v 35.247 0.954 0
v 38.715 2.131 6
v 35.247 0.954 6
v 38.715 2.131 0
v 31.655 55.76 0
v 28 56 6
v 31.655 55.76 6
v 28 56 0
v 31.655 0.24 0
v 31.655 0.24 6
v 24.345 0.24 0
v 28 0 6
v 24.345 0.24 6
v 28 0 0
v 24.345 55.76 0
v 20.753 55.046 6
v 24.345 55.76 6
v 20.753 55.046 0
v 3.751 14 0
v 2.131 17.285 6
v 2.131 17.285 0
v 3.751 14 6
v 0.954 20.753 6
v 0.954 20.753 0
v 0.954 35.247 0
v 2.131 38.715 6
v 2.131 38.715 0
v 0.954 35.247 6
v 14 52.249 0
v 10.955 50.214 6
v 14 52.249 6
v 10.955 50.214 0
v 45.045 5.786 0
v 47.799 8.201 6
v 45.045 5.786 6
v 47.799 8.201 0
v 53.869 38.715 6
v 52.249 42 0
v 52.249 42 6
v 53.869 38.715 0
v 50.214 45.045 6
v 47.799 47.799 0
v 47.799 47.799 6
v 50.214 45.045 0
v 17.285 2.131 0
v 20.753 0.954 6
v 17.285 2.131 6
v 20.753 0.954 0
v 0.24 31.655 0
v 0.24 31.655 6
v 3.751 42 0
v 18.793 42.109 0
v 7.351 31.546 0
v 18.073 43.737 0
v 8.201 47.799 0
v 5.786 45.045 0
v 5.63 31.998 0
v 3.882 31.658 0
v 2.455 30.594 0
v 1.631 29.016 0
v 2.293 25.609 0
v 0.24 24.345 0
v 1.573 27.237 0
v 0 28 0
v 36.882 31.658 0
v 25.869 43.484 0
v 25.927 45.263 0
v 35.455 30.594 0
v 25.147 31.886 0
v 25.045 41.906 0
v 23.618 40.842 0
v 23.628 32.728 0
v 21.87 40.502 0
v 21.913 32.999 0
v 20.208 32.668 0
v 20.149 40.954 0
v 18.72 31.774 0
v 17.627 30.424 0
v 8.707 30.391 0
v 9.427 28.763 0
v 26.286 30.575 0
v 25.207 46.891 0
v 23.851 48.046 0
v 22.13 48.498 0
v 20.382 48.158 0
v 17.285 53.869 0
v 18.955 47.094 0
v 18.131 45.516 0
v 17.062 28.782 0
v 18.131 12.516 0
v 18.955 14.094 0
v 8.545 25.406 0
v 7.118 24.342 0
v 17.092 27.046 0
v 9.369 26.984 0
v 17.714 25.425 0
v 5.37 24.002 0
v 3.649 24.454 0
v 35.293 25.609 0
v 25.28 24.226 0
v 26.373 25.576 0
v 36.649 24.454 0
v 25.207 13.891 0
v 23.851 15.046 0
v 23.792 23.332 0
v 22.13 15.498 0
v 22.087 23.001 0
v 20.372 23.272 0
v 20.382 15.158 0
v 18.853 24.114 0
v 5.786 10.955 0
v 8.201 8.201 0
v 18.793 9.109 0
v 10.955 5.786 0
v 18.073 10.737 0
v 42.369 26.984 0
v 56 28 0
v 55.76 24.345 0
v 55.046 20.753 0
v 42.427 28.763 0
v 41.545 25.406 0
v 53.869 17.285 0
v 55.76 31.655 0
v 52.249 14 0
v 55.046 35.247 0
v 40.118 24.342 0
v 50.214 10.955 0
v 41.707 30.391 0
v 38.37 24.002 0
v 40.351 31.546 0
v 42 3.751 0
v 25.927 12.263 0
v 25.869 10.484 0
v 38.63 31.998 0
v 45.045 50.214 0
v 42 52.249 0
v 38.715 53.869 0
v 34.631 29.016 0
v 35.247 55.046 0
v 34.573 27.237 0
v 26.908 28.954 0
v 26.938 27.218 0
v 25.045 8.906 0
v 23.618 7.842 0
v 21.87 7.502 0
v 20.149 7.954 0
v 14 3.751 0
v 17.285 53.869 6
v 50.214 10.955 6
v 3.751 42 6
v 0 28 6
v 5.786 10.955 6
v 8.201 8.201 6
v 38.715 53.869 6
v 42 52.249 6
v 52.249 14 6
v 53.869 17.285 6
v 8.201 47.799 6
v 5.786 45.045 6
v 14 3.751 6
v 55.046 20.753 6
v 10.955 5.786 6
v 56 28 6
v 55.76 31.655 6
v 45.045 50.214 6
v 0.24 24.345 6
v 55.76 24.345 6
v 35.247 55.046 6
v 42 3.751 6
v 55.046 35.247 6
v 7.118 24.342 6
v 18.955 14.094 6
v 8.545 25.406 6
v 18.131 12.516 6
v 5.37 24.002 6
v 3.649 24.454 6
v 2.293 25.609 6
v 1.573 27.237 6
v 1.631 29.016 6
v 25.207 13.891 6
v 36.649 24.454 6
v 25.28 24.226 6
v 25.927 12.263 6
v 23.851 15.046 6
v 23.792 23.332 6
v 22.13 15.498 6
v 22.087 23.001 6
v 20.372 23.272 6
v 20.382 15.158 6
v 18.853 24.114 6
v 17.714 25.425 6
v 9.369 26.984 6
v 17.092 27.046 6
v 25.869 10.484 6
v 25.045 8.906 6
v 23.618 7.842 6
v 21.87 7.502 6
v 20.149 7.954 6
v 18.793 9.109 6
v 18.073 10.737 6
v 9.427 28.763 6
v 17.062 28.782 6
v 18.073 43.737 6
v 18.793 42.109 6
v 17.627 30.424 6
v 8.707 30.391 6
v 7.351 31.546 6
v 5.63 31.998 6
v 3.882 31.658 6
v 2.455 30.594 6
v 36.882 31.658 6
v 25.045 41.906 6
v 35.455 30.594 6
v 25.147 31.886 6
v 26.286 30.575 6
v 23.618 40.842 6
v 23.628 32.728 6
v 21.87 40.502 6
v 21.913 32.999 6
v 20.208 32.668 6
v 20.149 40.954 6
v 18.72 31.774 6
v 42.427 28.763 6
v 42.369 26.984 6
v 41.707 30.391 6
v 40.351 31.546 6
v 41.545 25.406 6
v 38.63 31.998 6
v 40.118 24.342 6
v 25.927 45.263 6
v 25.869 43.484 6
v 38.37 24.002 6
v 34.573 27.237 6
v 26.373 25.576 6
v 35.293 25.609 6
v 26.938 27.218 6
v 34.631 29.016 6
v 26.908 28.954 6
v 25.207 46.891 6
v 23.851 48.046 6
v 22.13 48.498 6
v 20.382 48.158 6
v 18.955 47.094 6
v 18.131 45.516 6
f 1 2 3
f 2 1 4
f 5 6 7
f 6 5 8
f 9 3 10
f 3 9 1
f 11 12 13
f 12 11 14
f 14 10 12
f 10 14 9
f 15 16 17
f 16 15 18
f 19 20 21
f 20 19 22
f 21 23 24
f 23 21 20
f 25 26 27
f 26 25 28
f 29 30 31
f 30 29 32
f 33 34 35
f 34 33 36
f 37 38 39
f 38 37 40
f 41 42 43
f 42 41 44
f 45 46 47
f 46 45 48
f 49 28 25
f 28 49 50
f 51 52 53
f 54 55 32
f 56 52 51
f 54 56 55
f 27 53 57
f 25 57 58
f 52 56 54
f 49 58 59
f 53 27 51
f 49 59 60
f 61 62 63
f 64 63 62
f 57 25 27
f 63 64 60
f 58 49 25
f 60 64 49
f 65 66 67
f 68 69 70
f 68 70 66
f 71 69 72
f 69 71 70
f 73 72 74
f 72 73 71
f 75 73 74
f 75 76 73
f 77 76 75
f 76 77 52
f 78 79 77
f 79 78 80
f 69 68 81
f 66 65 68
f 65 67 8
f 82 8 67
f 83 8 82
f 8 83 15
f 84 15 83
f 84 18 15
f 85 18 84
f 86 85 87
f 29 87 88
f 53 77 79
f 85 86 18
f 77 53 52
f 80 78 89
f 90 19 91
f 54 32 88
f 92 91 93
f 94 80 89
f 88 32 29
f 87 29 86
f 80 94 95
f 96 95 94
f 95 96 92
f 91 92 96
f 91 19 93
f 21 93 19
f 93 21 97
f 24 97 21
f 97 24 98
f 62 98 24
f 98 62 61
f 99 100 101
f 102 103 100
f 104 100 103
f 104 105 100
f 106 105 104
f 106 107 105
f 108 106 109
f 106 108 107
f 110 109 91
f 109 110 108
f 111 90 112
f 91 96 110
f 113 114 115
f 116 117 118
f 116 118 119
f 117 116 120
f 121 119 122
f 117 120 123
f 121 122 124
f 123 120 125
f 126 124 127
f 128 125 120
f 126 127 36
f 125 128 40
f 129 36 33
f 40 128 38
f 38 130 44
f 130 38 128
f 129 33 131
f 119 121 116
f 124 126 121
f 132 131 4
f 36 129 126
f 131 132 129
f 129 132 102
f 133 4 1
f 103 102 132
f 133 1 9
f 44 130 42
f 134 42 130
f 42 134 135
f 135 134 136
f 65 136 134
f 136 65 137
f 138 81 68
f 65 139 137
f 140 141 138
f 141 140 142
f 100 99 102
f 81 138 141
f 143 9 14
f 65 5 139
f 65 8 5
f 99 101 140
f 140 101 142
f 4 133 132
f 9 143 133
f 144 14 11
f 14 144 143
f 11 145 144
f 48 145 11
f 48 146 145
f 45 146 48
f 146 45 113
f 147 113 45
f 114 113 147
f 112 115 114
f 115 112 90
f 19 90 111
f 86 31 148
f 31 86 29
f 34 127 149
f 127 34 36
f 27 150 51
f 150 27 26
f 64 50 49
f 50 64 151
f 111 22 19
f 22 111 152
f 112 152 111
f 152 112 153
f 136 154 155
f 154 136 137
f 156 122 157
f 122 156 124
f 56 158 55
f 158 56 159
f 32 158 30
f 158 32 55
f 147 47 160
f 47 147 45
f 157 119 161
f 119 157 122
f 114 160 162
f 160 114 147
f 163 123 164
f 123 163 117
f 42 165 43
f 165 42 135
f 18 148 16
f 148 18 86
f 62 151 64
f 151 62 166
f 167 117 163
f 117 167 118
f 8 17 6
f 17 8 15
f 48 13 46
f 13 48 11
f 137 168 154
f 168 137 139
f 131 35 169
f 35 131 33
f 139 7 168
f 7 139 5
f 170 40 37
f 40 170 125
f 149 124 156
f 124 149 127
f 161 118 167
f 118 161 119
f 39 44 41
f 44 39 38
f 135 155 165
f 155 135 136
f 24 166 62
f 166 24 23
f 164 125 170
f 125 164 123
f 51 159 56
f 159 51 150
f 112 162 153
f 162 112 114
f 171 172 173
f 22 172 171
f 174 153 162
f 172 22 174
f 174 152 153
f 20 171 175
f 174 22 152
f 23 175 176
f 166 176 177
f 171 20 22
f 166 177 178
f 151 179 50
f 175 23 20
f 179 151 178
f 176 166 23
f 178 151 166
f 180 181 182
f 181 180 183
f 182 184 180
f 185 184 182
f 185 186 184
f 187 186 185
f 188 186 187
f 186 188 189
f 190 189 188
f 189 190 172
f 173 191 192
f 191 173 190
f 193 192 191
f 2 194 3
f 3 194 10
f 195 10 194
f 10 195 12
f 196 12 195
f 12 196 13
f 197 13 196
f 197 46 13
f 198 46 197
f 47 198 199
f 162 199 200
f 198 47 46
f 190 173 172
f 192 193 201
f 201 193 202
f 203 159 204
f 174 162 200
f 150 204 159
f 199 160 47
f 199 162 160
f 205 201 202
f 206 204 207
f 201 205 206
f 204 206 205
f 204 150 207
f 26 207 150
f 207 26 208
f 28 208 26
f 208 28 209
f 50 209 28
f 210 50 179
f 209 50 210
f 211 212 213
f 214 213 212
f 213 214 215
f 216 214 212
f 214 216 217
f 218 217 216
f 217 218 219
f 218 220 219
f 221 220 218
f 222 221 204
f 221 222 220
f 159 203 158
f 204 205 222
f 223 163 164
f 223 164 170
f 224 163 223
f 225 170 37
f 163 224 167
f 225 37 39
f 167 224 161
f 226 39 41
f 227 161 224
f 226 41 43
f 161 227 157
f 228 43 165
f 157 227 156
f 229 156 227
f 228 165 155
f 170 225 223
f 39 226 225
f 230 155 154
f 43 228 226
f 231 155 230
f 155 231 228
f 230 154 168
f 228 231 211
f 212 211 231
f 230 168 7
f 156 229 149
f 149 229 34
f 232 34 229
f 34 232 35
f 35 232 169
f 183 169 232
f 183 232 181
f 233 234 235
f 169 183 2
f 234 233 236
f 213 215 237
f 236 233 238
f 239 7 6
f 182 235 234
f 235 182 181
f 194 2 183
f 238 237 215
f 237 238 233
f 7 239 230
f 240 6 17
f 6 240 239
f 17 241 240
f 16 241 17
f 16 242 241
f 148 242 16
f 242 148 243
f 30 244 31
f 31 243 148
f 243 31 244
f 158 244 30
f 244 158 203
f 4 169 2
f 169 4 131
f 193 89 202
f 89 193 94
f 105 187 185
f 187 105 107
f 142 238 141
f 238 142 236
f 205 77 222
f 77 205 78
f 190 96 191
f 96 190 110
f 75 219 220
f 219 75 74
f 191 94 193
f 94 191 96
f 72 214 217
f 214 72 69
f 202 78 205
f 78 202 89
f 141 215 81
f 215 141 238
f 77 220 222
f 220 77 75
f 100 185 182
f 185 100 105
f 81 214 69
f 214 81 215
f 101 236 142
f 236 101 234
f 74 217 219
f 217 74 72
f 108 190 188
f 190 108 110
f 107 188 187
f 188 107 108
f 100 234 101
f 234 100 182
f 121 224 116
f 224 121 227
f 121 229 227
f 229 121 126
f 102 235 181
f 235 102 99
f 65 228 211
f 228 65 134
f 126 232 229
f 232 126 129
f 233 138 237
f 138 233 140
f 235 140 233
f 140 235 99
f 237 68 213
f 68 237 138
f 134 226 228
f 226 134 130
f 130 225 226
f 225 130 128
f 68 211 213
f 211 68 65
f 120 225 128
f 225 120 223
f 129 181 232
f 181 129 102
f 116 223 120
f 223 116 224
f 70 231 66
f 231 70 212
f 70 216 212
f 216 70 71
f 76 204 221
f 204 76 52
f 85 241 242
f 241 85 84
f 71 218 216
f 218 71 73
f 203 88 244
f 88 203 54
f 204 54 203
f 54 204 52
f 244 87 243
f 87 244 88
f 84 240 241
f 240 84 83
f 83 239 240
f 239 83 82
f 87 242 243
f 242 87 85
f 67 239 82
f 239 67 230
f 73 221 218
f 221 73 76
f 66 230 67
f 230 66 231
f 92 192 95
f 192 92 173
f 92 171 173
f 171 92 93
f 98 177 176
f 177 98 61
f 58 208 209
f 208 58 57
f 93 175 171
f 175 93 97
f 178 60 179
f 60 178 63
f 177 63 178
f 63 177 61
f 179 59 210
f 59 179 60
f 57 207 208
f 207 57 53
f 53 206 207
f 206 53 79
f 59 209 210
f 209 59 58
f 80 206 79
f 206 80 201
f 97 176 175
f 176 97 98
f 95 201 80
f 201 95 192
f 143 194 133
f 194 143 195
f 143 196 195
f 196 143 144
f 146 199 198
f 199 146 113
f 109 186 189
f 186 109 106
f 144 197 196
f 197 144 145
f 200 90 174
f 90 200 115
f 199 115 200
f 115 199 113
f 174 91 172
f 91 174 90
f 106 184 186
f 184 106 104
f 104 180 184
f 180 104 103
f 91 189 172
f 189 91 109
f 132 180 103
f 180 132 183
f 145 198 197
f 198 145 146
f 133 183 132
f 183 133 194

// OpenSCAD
$fn = 32;

// ----------------------------------------------------------------------
// Cam plate: eccentric cam, base R28
// ----------------------------------------------------------------------

// --- parameters (mm) ---
base_r = 28;              // base circle radius
lobe_h = 8;               // cam lobe rise
bore_r = 5;               // shaft bore radius
plate_t = 6;              // plate thickness, Z (extrusion height)
ecc = 6;                  // disc eccentricity
ring_r = 16.5;            // lightening ring radius
bolt_r = 4;               // lightening hole radius

profile = [[56, 28], [55.76, 31.655], [55.046, 35.247], [53.869, 38.715], [52.249, 42], [50.214, 45.045], [47.799, 47.799], [45.045, 50.214], [42, 52.249], [38.715, 53.869], [35.247, 55.046], [31.655, 55.76], [28, 56], [24.345, 55.76], [20.753, 55.046], [17.285, 53.869], [14, 52.249], [10.955, 50.214], [8.201, 47.799], [5.786, 45.045], [3.751, 42], [2.131, 38.715], [0.954, 35.247], [0.24, 31.655], [0, 28], [0.24, 24.345], [0.954, 20.753], [2.131, 17.285], [3.751, 14], [5.786, 10.955], [8.201, 8.201], [10.955, 5.786], [14, 3.751], [17.285, 2.131], [20.753, 0.954], [24.345, 0.24], [28, 0], [31.655, 0.24], [35.247, 0.954], [38.715, 2.131], [42, 3.751], [45.045, 5.786], [47.799, 8.201], [50.214, 10.955], [52.249, 14], [53.869, 17.285], [55.046, 20.753], [55.76, 24.345]];  // primary outline, 48 points, counter clockwise
void_1 = [[26.908, 28.954], [26.286, 30.575], [25.147, 31.886], [23.628, 32.728], [21.913, 32.999], [20.208, 32.668], [18.72, 31.774], [17.627, 30.424], [17.062, 28.782], [17.092, 27.046], [17.714, 25.425], [18.853, 24.114], [20.372, 23.272], [22.087, 23.001], [23.792, 23.332], [25.28, 24.226], [26.373, 25.576], [26.938, 27.218]];  // shaft bore, 18 points
void_2 = [[42.427, 28.763], [41.707, 30.391], [40.351, 31.546], [38.63, 31.998], [36.882, 31.658], [35.455, 30.594], [34.631, 29.016], [34.573, 27.237], [35.293, 25.609], [36.649, 24.454], [38.37, 24.002], [40.118, 24.342], [41.545, 25.406], [42.369, 26.984]];  // lightening hole 1, 14 points
void_3 = [[25.927, 45.263], [25.207, 46.891], [23.851, 48.046], [22.13, 48.498], [20.382, 48.158], [18.955, 47.094], [18.131, 45.516], [18.073, 43.737], [18.793, 42.109], [20.149, 40.954], [21.87, 40.502], [23.618, 40.842], [25.045, 41.906], [25.869, 43.484]];  // lightening hole 2, 14 points
void_4 = [[9.427, 28.763], [8.707, 30.391], [7.351, 31.546], [5.63, 31.998], [3.882, 31.658], [2.455, 30.594], [1.631, 29.016], [1.573, 27.237], [2.293, 25.609], [3.649, 24.454], [5.37, 24.002], [7.118, 24.342], [8.545, 25.406], [9.369, 26.984]];  // lightening hole 3, 14 points
void_5 = [[25.927, 12.263], [25.207, 13.891], [23.851, 15.046], [22.13, 15.498], [20.382, 15.158], [18.955, 14.094], [18.131, 12.516], [18.073, 10.737], [18.793, 9.109], [20.149, 7.954], [21.87, 7.502], [23.618, 7.842], [25.045, 8.906], [25.869, 10.484]];  // lightening hole 4, 14 points

// --- the one profile operation ---
difference() {
  linear_extrude(height = plate_t) polygon(points = profile);
  translate([0, 0, -1])
    linear_extrude(height = plate_t + 2) polygon(points = void_1);
  translate([0, 0, -1])
    linear_extrude(height = plate_t + 2) polygon(points = void_2);
  translate([0, 0, -1])
    linear_extrude(height = plate_t + 2) polygon(points = void_3);
  translate([0, 0, -1])
    linear_extrude(height = plate_t + 2) polygon(points = void_4);
  translate([0, 0, -1])
    linear_extrude(height = plate_t + 2) polygon(points = void_5);
}
